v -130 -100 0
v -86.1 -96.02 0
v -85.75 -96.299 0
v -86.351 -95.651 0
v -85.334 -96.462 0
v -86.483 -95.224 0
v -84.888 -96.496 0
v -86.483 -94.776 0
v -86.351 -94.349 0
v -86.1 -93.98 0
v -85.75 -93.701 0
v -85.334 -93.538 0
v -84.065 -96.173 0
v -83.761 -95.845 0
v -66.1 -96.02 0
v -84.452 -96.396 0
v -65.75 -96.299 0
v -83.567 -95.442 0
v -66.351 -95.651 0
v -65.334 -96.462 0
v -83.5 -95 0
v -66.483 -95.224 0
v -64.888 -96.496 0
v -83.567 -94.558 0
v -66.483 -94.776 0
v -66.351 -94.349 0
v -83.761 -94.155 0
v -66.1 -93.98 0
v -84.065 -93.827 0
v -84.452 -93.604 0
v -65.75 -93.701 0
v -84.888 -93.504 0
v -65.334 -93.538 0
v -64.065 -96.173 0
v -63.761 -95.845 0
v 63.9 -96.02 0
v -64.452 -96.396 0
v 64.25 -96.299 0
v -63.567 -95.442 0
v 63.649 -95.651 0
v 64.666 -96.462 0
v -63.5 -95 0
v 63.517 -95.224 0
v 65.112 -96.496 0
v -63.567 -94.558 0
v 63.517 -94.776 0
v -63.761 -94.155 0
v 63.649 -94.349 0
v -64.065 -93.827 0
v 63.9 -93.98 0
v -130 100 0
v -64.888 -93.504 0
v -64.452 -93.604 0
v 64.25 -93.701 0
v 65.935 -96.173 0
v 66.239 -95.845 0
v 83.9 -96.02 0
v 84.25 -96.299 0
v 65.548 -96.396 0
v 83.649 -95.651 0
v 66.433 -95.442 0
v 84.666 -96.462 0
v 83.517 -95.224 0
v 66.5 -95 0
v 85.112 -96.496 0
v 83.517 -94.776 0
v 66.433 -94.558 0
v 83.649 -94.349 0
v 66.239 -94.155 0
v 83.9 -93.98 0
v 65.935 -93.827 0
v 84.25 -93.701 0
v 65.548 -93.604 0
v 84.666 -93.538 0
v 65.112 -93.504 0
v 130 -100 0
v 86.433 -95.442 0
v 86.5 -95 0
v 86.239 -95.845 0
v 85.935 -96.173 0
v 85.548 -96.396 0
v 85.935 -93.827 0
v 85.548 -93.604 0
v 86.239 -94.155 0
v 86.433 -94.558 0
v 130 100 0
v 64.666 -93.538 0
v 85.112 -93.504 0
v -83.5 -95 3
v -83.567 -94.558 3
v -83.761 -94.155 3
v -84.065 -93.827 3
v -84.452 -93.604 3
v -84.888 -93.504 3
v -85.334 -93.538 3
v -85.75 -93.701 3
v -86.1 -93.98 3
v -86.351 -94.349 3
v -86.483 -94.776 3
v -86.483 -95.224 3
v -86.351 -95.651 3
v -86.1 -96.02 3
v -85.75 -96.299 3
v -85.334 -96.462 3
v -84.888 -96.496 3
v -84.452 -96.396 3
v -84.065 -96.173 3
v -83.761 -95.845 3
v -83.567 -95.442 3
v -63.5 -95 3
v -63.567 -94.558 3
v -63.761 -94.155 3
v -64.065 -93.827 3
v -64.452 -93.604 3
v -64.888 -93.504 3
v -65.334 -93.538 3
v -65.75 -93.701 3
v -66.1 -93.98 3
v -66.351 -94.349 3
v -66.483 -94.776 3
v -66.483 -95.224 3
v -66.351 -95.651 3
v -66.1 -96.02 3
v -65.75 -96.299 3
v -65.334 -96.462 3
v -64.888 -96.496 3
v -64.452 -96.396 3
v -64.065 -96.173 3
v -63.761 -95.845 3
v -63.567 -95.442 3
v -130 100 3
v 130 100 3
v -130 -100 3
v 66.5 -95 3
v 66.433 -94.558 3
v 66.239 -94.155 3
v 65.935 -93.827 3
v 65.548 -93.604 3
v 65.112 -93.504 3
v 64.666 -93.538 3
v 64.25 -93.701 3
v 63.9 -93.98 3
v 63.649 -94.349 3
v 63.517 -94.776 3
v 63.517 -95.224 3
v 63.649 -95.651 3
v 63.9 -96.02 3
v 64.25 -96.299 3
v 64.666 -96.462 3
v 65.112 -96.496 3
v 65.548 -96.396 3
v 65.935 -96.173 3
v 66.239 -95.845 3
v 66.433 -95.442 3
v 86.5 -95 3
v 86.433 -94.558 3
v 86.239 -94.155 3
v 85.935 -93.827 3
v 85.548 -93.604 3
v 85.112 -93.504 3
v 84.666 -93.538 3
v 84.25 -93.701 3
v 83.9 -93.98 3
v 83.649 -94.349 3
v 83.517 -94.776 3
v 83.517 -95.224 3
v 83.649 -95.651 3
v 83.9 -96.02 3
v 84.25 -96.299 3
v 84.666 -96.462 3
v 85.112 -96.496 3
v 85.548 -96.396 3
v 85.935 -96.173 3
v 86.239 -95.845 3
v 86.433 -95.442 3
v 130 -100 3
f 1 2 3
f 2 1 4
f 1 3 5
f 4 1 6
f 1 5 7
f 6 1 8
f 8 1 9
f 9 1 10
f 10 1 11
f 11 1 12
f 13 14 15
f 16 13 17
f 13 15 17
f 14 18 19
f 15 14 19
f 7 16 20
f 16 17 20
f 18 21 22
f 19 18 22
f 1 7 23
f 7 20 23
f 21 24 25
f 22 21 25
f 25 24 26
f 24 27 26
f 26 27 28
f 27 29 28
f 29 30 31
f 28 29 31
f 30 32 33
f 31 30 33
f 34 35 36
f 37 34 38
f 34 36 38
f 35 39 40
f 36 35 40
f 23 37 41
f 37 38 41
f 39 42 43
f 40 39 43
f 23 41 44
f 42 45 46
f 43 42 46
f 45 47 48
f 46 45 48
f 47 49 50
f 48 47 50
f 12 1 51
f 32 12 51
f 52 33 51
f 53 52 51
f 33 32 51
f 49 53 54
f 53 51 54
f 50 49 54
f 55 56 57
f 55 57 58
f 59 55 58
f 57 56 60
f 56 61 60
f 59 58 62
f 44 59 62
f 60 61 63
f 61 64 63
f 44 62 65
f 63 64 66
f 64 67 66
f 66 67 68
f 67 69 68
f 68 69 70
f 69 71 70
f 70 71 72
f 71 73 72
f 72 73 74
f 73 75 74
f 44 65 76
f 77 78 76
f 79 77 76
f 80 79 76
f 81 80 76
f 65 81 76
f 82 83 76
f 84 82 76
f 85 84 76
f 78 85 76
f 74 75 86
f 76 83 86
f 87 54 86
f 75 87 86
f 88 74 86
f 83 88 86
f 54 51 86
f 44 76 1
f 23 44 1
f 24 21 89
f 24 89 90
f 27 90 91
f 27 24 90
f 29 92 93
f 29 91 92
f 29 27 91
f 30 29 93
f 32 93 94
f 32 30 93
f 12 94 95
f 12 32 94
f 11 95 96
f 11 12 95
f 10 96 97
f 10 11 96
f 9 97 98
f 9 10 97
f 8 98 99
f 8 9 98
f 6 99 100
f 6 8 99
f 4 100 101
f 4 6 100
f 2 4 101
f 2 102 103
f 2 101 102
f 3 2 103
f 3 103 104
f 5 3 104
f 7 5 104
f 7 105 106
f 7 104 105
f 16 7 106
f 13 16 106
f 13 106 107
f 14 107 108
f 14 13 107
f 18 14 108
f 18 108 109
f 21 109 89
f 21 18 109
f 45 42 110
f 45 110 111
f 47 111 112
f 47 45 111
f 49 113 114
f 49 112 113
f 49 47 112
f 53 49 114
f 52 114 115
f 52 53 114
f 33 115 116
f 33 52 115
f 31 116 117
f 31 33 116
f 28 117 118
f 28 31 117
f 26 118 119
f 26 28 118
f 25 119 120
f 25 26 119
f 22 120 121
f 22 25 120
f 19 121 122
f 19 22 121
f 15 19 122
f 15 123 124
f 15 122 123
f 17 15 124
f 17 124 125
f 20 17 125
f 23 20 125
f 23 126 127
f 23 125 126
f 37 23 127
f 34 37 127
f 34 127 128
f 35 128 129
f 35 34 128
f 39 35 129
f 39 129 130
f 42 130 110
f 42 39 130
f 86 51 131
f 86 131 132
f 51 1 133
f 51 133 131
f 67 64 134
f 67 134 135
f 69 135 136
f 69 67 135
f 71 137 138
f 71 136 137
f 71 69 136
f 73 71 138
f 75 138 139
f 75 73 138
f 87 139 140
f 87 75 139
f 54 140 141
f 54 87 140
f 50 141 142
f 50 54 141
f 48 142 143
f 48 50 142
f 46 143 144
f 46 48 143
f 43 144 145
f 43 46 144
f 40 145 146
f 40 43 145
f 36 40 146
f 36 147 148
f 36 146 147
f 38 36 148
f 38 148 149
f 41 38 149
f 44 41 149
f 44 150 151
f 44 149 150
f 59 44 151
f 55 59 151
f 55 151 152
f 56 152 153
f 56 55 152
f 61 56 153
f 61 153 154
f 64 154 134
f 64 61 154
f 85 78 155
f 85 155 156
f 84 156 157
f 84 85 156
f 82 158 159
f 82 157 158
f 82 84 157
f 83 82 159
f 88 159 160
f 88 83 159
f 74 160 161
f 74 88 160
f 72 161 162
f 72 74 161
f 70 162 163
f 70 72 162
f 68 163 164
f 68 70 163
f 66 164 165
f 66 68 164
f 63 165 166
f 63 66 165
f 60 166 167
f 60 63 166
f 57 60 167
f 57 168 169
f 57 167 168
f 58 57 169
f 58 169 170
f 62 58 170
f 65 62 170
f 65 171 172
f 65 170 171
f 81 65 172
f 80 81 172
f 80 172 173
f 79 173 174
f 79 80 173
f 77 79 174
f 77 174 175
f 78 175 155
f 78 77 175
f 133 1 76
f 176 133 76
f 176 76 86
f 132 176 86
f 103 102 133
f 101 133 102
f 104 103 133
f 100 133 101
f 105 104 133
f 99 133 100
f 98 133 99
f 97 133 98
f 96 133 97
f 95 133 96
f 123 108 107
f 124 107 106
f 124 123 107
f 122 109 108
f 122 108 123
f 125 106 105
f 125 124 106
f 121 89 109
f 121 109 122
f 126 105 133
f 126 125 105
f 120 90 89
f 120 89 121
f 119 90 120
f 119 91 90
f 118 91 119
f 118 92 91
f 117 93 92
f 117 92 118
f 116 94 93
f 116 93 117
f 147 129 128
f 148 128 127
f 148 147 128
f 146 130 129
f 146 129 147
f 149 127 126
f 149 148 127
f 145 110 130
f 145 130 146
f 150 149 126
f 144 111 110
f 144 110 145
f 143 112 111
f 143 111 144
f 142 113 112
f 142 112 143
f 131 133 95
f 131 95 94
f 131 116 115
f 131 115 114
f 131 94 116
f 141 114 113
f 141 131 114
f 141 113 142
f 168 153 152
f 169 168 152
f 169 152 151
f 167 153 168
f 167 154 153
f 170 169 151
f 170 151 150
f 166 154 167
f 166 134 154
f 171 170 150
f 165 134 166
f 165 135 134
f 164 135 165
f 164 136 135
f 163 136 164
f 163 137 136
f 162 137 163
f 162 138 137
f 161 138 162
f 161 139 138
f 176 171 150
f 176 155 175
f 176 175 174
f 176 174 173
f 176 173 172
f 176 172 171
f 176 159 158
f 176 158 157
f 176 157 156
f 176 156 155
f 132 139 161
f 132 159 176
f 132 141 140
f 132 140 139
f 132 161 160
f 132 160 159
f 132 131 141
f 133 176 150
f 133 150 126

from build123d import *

# Parameters (mm, degrees)
SKETCH1_W               = 260
SKETCH1_H               = 200
BOSS_EXTRUDE1_DEPTH     = 3
CUT_EXTRUDE1_DEPTH      = 165.039629358
CUT_EXTRUDE1_DEPTH_BACK = 165.039629358
SKETCH2_R               = 1.5


with BuildPart() as part:
    # Sketch1 → Boss-Extrude1 (new body)
    with BuildSketch(Plane.XY):
        Rectangle(SKETCH1_W, SKETCH1_H)
    extrude(amount=BOSS_EXTRUDE1_DEPTH)

    # Sketch2 → Cut-Extrude1 (cut, two sides: drawn at the far end of the back side and taken through both)
    with BuildSketch(Plane.XY.offset(3).offset(-CUT_EXTRUDE1_DEPTH_BACK)):
        with Locations((-65, -95)):
            Circle(SKETCH2_R)
        with Locations((-85, -95)):
            Circle(SKETCH2_R)
        with Locations((85, -95)):
            Circle(SKETCH2_R)
        with Locations((65, -95)):
            Circle(SKETCH2_R)
    extrude(amount=CUT_EXTRUDE1_DEPTH + CUT_EXTRUDE1_DEPTH_BACK, mode=Mode.SUBTRACT)


solid = part.part
